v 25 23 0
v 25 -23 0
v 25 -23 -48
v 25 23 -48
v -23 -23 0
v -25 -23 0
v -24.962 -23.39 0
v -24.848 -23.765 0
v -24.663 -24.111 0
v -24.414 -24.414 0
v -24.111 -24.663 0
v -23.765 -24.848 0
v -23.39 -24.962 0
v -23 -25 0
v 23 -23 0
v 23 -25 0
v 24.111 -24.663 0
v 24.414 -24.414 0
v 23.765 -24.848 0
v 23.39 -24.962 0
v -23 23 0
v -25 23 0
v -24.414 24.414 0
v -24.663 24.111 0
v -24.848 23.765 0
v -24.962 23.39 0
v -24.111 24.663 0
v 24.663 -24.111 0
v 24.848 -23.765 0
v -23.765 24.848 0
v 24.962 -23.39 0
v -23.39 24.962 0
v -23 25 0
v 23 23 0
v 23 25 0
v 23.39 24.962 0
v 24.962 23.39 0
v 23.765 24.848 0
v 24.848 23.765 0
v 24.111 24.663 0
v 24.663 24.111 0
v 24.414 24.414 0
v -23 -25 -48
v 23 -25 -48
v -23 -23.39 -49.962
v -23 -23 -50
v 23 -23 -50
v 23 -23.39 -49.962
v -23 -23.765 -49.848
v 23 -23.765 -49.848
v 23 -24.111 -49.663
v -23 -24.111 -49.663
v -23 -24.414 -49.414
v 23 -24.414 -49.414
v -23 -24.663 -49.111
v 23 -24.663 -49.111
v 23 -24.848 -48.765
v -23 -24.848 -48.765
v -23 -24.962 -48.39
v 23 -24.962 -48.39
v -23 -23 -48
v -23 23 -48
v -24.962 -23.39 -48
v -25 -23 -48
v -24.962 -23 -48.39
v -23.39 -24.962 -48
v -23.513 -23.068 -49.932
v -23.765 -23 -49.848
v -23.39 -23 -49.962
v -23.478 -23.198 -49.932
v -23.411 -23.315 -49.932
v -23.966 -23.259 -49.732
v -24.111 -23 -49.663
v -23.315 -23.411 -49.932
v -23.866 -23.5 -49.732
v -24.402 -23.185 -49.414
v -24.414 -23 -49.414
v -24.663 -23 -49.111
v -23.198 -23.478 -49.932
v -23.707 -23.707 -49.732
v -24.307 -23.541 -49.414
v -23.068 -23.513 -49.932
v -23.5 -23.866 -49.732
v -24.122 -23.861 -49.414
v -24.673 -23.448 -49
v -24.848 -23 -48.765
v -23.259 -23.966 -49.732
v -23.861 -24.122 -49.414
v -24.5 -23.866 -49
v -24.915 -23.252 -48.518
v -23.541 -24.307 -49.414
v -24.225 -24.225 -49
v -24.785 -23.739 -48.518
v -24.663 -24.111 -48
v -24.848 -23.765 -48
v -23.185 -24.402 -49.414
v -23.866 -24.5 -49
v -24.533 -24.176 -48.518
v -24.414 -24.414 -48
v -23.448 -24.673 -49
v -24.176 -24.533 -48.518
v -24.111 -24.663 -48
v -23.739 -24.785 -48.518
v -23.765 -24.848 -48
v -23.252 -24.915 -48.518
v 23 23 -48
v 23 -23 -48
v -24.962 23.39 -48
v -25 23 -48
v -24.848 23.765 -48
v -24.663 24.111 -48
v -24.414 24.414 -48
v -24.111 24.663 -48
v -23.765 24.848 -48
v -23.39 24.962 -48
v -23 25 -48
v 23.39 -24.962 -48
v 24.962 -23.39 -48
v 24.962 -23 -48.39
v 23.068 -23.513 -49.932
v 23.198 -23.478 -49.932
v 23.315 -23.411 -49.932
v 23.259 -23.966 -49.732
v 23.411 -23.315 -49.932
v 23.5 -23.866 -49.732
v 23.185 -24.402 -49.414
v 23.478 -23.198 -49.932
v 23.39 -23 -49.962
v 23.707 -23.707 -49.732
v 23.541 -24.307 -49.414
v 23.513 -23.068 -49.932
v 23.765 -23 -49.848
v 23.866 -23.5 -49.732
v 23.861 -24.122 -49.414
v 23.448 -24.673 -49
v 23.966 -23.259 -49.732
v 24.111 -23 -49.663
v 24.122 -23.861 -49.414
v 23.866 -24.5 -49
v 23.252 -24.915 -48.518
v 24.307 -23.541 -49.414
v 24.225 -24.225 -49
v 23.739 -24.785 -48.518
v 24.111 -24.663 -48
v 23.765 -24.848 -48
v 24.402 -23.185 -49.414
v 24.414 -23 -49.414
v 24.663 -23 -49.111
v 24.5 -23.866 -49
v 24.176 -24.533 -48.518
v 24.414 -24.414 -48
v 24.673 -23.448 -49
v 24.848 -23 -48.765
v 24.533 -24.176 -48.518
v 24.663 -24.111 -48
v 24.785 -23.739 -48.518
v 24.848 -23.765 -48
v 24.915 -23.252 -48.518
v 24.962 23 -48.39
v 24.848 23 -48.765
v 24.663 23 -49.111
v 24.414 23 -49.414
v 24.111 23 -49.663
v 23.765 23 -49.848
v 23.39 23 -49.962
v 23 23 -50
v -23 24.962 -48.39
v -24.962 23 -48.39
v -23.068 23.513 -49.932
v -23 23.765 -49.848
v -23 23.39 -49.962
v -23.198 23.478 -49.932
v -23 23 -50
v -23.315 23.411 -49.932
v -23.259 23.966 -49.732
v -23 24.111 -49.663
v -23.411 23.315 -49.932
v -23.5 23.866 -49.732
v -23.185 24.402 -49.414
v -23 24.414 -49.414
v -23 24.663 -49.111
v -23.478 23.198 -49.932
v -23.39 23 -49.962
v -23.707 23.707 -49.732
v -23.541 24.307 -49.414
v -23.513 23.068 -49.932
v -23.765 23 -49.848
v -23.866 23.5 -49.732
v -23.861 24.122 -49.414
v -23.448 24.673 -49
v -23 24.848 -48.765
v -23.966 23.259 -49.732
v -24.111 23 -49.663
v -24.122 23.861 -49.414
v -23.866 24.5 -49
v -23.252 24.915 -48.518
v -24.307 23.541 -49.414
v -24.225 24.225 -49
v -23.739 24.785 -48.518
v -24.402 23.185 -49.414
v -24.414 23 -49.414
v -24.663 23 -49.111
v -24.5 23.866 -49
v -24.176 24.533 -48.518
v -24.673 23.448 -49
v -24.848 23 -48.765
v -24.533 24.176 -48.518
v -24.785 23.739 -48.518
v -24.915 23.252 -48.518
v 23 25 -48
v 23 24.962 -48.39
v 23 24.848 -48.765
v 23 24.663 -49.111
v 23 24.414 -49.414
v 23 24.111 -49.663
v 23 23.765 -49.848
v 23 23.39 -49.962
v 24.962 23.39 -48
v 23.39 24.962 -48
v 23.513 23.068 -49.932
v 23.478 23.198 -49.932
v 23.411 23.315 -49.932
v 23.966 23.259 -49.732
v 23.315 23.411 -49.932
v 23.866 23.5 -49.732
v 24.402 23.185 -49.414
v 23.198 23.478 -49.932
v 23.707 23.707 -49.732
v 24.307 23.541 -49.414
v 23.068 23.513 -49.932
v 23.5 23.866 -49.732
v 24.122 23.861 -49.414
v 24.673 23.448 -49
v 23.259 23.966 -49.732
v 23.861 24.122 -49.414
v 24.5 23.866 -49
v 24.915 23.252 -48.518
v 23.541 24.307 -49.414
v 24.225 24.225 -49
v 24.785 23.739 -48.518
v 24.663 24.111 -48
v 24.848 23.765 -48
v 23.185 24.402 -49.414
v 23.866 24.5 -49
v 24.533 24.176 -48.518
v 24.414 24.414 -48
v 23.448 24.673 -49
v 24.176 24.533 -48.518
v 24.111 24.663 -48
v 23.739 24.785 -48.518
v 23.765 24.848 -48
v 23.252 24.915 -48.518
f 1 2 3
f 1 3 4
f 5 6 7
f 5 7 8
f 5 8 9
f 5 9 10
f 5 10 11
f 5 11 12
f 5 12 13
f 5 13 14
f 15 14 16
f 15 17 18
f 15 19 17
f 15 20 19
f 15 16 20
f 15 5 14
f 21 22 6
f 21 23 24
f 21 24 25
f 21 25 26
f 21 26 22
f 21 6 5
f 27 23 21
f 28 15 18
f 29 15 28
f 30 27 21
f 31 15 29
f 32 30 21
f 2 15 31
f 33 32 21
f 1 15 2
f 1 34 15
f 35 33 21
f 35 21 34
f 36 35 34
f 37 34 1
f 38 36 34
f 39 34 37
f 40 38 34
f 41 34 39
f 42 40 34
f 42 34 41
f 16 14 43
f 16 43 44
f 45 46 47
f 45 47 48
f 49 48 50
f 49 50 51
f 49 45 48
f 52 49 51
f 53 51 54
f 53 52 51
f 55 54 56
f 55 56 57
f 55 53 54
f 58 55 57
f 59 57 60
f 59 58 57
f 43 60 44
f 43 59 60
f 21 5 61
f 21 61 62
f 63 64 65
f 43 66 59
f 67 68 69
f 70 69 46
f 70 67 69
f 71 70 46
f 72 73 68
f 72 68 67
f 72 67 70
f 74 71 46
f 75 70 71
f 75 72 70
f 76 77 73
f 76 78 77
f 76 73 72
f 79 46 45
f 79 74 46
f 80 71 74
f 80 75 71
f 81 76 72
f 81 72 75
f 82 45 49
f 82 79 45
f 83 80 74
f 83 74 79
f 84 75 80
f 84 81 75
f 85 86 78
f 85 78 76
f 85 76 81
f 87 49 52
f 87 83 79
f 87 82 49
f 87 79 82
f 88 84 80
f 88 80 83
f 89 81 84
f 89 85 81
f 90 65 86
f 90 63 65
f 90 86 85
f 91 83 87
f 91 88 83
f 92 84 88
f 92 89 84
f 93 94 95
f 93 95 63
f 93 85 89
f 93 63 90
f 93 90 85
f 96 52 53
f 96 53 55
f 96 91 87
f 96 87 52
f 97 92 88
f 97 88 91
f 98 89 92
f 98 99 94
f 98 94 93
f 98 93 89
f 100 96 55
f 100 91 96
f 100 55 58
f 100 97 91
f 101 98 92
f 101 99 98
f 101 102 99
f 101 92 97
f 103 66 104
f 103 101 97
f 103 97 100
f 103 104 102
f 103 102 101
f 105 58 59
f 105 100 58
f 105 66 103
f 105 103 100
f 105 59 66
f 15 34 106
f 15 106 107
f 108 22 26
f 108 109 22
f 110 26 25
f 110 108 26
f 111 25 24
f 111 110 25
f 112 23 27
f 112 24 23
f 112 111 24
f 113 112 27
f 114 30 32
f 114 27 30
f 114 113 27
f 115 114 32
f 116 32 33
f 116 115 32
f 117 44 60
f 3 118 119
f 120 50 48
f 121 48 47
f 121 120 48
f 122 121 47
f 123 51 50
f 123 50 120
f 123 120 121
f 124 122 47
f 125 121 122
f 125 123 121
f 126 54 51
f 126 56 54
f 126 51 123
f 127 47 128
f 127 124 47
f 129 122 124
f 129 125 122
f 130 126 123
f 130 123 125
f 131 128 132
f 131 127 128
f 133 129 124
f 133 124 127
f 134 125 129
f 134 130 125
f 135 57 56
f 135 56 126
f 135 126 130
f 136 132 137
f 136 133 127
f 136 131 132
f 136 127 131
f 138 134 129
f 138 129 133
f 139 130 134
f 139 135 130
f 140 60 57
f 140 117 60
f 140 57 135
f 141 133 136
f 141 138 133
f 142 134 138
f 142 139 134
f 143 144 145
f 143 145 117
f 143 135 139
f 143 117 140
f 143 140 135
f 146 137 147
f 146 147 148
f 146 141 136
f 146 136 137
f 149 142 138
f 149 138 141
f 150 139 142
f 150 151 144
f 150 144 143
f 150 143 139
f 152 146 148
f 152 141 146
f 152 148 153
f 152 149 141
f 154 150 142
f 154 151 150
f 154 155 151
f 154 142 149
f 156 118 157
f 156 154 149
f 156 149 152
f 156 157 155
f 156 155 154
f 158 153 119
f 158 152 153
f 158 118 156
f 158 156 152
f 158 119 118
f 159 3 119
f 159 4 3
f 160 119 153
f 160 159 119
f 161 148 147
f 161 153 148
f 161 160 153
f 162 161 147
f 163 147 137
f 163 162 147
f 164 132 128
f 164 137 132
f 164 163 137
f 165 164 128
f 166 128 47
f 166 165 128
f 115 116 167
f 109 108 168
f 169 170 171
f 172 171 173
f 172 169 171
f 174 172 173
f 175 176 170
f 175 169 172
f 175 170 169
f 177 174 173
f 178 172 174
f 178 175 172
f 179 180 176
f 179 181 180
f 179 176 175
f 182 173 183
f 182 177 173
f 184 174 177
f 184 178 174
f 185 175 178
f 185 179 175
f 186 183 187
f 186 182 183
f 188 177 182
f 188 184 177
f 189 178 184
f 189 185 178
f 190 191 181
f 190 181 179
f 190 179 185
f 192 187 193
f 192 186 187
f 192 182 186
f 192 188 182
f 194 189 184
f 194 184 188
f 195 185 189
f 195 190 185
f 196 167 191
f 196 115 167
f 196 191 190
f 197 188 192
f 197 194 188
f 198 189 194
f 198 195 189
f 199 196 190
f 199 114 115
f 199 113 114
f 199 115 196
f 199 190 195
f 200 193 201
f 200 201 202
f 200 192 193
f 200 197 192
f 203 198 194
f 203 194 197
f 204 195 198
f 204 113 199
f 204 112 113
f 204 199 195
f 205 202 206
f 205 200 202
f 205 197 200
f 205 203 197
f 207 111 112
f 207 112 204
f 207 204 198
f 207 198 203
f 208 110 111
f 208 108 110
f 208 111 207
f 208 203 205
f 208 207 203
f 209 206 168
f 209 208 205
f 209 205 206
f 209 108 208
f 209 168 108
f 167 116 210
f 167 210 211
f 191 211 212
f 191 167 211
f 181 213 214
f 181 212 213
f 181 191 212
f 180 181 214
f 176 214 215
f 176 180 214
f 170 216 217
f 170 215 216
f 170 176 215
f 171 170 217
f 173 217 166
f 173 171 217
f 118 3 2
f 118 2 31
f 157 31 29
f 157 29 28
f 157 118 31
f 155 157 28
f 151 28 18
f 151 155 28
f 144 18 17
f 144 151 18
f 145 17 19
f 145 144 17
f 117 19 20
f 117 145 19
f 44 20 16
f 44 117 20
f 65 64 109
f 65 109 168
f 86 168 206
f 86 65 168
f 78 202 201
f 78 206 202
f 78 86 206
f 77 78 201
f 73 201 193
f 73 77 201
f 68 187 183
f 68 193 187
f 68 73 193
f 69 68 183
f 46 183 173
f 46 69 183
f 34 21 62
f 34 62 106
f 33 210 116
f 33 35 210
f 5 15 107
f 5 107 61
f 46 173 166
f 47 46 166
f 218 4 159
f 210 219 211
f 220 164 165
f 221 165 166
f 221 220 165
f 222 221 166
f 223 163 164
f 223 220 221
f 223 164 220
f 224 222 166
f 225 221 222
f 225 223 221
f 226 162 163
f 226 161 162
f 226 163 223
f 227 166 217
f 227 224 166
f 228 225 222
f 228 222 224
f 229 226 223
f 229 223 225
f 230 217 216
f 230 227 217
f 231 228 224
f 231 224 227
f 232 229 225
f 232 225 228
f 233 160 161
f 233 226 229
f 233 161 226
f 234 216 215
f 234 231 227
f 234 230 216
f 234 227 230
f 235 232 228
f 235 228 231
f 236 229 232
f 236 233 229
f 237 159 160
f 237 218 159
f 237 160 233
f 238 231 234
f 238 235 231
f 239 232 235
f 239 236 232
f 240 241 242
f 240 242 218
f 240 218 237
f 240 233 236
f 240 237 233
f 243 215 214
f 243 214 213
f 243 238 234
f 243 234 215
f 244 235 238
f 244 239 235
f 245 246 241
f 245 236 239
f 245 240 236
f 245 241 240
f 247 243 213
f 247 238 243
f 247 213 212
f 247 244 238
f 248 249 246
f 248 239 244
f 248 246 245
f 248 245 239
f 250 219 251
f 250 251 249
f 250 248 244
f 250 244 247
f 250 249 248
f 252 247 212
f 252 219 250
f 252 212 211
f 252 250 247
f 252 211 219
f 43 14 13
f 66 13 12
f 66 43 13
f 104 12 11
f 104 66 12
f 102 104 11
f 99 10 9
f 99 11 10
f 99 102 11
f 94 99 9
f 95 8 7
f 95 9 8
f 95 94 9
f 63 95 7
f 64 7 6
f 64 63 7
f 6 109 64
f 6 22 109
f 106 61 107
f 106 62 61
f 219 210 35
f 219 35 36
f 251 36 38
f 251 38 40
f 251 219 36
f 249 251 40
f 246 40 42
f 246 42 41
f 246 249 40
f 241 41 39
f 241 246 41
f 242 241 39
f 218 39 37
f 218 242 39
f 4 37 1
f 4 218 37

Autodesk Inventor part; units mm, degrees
ref_plane "YZ Plane" through (0, 0, 0) normal (1, 0, 0) x (0, 1, 0)
ref_plane "XZ Plane" through (0, 0, 0) normal (0, 1, 0) x (-1, 0, 0)
ref_plane "XY Plane" through (0, 0, 0) normal (0, 0, 1) x (1, 0, 0)
sketch "Sketch1" plane through (0, 0, 0) normal (0, 0, 1) x (1, 0, 0)
  line L0 (0, 0) -> (900, 0)
  line L1 (0, 0) -> (-900, 0)
  line L2 (0, 0) -> (0, -900)
  line L3 (0, 0) -> (0, 900)
  line L4 (-25, -25) -> (25, -25)
  line L5 (25, -25) -> (25, 25)
  line L6 (25, 25) -> (-25, 25)
  line L7 (-25, 25) -> (-25, -25)
  line L8 (-23, 23) -> (23, 23)
  line L9 (23, 23) -> (23, -23)
  line L10 (23, -23) -> (-23, -23)
  line L11 (-23, -23) -> (-23, 23)
  dimension "d0" = 900
  dimension "d1" = 900
  dimension "d2" = 900
  dimension "d3" = 900
  dimension "d4" = 25
  dimension "d5" = 25
  dimension "d6" = 25
  dimension "d7" = 25
  dimension "d9" = 2
extrude "Extrusion1" add sketch "Sketch1" against normal blind 50
extrude "Extrusion2" cut sketch "Sketch1" against normal blind 48 contours L3 L8 L9 L0 | L2 L10 L11 L1 | L0 L9 L10 L2 | L1 L11 L8 L3
fillet "Fillet1" radius 2 8 edges at (-25, -25, -25) (-25, 25, -25) (25, 25, -25) (0, 25, -50) (25, -25, -25) (25, 0, -50) (0, -25, -50) (-25, 0, -50)
properties part number "small_capsule" material "ABS Plastic"
